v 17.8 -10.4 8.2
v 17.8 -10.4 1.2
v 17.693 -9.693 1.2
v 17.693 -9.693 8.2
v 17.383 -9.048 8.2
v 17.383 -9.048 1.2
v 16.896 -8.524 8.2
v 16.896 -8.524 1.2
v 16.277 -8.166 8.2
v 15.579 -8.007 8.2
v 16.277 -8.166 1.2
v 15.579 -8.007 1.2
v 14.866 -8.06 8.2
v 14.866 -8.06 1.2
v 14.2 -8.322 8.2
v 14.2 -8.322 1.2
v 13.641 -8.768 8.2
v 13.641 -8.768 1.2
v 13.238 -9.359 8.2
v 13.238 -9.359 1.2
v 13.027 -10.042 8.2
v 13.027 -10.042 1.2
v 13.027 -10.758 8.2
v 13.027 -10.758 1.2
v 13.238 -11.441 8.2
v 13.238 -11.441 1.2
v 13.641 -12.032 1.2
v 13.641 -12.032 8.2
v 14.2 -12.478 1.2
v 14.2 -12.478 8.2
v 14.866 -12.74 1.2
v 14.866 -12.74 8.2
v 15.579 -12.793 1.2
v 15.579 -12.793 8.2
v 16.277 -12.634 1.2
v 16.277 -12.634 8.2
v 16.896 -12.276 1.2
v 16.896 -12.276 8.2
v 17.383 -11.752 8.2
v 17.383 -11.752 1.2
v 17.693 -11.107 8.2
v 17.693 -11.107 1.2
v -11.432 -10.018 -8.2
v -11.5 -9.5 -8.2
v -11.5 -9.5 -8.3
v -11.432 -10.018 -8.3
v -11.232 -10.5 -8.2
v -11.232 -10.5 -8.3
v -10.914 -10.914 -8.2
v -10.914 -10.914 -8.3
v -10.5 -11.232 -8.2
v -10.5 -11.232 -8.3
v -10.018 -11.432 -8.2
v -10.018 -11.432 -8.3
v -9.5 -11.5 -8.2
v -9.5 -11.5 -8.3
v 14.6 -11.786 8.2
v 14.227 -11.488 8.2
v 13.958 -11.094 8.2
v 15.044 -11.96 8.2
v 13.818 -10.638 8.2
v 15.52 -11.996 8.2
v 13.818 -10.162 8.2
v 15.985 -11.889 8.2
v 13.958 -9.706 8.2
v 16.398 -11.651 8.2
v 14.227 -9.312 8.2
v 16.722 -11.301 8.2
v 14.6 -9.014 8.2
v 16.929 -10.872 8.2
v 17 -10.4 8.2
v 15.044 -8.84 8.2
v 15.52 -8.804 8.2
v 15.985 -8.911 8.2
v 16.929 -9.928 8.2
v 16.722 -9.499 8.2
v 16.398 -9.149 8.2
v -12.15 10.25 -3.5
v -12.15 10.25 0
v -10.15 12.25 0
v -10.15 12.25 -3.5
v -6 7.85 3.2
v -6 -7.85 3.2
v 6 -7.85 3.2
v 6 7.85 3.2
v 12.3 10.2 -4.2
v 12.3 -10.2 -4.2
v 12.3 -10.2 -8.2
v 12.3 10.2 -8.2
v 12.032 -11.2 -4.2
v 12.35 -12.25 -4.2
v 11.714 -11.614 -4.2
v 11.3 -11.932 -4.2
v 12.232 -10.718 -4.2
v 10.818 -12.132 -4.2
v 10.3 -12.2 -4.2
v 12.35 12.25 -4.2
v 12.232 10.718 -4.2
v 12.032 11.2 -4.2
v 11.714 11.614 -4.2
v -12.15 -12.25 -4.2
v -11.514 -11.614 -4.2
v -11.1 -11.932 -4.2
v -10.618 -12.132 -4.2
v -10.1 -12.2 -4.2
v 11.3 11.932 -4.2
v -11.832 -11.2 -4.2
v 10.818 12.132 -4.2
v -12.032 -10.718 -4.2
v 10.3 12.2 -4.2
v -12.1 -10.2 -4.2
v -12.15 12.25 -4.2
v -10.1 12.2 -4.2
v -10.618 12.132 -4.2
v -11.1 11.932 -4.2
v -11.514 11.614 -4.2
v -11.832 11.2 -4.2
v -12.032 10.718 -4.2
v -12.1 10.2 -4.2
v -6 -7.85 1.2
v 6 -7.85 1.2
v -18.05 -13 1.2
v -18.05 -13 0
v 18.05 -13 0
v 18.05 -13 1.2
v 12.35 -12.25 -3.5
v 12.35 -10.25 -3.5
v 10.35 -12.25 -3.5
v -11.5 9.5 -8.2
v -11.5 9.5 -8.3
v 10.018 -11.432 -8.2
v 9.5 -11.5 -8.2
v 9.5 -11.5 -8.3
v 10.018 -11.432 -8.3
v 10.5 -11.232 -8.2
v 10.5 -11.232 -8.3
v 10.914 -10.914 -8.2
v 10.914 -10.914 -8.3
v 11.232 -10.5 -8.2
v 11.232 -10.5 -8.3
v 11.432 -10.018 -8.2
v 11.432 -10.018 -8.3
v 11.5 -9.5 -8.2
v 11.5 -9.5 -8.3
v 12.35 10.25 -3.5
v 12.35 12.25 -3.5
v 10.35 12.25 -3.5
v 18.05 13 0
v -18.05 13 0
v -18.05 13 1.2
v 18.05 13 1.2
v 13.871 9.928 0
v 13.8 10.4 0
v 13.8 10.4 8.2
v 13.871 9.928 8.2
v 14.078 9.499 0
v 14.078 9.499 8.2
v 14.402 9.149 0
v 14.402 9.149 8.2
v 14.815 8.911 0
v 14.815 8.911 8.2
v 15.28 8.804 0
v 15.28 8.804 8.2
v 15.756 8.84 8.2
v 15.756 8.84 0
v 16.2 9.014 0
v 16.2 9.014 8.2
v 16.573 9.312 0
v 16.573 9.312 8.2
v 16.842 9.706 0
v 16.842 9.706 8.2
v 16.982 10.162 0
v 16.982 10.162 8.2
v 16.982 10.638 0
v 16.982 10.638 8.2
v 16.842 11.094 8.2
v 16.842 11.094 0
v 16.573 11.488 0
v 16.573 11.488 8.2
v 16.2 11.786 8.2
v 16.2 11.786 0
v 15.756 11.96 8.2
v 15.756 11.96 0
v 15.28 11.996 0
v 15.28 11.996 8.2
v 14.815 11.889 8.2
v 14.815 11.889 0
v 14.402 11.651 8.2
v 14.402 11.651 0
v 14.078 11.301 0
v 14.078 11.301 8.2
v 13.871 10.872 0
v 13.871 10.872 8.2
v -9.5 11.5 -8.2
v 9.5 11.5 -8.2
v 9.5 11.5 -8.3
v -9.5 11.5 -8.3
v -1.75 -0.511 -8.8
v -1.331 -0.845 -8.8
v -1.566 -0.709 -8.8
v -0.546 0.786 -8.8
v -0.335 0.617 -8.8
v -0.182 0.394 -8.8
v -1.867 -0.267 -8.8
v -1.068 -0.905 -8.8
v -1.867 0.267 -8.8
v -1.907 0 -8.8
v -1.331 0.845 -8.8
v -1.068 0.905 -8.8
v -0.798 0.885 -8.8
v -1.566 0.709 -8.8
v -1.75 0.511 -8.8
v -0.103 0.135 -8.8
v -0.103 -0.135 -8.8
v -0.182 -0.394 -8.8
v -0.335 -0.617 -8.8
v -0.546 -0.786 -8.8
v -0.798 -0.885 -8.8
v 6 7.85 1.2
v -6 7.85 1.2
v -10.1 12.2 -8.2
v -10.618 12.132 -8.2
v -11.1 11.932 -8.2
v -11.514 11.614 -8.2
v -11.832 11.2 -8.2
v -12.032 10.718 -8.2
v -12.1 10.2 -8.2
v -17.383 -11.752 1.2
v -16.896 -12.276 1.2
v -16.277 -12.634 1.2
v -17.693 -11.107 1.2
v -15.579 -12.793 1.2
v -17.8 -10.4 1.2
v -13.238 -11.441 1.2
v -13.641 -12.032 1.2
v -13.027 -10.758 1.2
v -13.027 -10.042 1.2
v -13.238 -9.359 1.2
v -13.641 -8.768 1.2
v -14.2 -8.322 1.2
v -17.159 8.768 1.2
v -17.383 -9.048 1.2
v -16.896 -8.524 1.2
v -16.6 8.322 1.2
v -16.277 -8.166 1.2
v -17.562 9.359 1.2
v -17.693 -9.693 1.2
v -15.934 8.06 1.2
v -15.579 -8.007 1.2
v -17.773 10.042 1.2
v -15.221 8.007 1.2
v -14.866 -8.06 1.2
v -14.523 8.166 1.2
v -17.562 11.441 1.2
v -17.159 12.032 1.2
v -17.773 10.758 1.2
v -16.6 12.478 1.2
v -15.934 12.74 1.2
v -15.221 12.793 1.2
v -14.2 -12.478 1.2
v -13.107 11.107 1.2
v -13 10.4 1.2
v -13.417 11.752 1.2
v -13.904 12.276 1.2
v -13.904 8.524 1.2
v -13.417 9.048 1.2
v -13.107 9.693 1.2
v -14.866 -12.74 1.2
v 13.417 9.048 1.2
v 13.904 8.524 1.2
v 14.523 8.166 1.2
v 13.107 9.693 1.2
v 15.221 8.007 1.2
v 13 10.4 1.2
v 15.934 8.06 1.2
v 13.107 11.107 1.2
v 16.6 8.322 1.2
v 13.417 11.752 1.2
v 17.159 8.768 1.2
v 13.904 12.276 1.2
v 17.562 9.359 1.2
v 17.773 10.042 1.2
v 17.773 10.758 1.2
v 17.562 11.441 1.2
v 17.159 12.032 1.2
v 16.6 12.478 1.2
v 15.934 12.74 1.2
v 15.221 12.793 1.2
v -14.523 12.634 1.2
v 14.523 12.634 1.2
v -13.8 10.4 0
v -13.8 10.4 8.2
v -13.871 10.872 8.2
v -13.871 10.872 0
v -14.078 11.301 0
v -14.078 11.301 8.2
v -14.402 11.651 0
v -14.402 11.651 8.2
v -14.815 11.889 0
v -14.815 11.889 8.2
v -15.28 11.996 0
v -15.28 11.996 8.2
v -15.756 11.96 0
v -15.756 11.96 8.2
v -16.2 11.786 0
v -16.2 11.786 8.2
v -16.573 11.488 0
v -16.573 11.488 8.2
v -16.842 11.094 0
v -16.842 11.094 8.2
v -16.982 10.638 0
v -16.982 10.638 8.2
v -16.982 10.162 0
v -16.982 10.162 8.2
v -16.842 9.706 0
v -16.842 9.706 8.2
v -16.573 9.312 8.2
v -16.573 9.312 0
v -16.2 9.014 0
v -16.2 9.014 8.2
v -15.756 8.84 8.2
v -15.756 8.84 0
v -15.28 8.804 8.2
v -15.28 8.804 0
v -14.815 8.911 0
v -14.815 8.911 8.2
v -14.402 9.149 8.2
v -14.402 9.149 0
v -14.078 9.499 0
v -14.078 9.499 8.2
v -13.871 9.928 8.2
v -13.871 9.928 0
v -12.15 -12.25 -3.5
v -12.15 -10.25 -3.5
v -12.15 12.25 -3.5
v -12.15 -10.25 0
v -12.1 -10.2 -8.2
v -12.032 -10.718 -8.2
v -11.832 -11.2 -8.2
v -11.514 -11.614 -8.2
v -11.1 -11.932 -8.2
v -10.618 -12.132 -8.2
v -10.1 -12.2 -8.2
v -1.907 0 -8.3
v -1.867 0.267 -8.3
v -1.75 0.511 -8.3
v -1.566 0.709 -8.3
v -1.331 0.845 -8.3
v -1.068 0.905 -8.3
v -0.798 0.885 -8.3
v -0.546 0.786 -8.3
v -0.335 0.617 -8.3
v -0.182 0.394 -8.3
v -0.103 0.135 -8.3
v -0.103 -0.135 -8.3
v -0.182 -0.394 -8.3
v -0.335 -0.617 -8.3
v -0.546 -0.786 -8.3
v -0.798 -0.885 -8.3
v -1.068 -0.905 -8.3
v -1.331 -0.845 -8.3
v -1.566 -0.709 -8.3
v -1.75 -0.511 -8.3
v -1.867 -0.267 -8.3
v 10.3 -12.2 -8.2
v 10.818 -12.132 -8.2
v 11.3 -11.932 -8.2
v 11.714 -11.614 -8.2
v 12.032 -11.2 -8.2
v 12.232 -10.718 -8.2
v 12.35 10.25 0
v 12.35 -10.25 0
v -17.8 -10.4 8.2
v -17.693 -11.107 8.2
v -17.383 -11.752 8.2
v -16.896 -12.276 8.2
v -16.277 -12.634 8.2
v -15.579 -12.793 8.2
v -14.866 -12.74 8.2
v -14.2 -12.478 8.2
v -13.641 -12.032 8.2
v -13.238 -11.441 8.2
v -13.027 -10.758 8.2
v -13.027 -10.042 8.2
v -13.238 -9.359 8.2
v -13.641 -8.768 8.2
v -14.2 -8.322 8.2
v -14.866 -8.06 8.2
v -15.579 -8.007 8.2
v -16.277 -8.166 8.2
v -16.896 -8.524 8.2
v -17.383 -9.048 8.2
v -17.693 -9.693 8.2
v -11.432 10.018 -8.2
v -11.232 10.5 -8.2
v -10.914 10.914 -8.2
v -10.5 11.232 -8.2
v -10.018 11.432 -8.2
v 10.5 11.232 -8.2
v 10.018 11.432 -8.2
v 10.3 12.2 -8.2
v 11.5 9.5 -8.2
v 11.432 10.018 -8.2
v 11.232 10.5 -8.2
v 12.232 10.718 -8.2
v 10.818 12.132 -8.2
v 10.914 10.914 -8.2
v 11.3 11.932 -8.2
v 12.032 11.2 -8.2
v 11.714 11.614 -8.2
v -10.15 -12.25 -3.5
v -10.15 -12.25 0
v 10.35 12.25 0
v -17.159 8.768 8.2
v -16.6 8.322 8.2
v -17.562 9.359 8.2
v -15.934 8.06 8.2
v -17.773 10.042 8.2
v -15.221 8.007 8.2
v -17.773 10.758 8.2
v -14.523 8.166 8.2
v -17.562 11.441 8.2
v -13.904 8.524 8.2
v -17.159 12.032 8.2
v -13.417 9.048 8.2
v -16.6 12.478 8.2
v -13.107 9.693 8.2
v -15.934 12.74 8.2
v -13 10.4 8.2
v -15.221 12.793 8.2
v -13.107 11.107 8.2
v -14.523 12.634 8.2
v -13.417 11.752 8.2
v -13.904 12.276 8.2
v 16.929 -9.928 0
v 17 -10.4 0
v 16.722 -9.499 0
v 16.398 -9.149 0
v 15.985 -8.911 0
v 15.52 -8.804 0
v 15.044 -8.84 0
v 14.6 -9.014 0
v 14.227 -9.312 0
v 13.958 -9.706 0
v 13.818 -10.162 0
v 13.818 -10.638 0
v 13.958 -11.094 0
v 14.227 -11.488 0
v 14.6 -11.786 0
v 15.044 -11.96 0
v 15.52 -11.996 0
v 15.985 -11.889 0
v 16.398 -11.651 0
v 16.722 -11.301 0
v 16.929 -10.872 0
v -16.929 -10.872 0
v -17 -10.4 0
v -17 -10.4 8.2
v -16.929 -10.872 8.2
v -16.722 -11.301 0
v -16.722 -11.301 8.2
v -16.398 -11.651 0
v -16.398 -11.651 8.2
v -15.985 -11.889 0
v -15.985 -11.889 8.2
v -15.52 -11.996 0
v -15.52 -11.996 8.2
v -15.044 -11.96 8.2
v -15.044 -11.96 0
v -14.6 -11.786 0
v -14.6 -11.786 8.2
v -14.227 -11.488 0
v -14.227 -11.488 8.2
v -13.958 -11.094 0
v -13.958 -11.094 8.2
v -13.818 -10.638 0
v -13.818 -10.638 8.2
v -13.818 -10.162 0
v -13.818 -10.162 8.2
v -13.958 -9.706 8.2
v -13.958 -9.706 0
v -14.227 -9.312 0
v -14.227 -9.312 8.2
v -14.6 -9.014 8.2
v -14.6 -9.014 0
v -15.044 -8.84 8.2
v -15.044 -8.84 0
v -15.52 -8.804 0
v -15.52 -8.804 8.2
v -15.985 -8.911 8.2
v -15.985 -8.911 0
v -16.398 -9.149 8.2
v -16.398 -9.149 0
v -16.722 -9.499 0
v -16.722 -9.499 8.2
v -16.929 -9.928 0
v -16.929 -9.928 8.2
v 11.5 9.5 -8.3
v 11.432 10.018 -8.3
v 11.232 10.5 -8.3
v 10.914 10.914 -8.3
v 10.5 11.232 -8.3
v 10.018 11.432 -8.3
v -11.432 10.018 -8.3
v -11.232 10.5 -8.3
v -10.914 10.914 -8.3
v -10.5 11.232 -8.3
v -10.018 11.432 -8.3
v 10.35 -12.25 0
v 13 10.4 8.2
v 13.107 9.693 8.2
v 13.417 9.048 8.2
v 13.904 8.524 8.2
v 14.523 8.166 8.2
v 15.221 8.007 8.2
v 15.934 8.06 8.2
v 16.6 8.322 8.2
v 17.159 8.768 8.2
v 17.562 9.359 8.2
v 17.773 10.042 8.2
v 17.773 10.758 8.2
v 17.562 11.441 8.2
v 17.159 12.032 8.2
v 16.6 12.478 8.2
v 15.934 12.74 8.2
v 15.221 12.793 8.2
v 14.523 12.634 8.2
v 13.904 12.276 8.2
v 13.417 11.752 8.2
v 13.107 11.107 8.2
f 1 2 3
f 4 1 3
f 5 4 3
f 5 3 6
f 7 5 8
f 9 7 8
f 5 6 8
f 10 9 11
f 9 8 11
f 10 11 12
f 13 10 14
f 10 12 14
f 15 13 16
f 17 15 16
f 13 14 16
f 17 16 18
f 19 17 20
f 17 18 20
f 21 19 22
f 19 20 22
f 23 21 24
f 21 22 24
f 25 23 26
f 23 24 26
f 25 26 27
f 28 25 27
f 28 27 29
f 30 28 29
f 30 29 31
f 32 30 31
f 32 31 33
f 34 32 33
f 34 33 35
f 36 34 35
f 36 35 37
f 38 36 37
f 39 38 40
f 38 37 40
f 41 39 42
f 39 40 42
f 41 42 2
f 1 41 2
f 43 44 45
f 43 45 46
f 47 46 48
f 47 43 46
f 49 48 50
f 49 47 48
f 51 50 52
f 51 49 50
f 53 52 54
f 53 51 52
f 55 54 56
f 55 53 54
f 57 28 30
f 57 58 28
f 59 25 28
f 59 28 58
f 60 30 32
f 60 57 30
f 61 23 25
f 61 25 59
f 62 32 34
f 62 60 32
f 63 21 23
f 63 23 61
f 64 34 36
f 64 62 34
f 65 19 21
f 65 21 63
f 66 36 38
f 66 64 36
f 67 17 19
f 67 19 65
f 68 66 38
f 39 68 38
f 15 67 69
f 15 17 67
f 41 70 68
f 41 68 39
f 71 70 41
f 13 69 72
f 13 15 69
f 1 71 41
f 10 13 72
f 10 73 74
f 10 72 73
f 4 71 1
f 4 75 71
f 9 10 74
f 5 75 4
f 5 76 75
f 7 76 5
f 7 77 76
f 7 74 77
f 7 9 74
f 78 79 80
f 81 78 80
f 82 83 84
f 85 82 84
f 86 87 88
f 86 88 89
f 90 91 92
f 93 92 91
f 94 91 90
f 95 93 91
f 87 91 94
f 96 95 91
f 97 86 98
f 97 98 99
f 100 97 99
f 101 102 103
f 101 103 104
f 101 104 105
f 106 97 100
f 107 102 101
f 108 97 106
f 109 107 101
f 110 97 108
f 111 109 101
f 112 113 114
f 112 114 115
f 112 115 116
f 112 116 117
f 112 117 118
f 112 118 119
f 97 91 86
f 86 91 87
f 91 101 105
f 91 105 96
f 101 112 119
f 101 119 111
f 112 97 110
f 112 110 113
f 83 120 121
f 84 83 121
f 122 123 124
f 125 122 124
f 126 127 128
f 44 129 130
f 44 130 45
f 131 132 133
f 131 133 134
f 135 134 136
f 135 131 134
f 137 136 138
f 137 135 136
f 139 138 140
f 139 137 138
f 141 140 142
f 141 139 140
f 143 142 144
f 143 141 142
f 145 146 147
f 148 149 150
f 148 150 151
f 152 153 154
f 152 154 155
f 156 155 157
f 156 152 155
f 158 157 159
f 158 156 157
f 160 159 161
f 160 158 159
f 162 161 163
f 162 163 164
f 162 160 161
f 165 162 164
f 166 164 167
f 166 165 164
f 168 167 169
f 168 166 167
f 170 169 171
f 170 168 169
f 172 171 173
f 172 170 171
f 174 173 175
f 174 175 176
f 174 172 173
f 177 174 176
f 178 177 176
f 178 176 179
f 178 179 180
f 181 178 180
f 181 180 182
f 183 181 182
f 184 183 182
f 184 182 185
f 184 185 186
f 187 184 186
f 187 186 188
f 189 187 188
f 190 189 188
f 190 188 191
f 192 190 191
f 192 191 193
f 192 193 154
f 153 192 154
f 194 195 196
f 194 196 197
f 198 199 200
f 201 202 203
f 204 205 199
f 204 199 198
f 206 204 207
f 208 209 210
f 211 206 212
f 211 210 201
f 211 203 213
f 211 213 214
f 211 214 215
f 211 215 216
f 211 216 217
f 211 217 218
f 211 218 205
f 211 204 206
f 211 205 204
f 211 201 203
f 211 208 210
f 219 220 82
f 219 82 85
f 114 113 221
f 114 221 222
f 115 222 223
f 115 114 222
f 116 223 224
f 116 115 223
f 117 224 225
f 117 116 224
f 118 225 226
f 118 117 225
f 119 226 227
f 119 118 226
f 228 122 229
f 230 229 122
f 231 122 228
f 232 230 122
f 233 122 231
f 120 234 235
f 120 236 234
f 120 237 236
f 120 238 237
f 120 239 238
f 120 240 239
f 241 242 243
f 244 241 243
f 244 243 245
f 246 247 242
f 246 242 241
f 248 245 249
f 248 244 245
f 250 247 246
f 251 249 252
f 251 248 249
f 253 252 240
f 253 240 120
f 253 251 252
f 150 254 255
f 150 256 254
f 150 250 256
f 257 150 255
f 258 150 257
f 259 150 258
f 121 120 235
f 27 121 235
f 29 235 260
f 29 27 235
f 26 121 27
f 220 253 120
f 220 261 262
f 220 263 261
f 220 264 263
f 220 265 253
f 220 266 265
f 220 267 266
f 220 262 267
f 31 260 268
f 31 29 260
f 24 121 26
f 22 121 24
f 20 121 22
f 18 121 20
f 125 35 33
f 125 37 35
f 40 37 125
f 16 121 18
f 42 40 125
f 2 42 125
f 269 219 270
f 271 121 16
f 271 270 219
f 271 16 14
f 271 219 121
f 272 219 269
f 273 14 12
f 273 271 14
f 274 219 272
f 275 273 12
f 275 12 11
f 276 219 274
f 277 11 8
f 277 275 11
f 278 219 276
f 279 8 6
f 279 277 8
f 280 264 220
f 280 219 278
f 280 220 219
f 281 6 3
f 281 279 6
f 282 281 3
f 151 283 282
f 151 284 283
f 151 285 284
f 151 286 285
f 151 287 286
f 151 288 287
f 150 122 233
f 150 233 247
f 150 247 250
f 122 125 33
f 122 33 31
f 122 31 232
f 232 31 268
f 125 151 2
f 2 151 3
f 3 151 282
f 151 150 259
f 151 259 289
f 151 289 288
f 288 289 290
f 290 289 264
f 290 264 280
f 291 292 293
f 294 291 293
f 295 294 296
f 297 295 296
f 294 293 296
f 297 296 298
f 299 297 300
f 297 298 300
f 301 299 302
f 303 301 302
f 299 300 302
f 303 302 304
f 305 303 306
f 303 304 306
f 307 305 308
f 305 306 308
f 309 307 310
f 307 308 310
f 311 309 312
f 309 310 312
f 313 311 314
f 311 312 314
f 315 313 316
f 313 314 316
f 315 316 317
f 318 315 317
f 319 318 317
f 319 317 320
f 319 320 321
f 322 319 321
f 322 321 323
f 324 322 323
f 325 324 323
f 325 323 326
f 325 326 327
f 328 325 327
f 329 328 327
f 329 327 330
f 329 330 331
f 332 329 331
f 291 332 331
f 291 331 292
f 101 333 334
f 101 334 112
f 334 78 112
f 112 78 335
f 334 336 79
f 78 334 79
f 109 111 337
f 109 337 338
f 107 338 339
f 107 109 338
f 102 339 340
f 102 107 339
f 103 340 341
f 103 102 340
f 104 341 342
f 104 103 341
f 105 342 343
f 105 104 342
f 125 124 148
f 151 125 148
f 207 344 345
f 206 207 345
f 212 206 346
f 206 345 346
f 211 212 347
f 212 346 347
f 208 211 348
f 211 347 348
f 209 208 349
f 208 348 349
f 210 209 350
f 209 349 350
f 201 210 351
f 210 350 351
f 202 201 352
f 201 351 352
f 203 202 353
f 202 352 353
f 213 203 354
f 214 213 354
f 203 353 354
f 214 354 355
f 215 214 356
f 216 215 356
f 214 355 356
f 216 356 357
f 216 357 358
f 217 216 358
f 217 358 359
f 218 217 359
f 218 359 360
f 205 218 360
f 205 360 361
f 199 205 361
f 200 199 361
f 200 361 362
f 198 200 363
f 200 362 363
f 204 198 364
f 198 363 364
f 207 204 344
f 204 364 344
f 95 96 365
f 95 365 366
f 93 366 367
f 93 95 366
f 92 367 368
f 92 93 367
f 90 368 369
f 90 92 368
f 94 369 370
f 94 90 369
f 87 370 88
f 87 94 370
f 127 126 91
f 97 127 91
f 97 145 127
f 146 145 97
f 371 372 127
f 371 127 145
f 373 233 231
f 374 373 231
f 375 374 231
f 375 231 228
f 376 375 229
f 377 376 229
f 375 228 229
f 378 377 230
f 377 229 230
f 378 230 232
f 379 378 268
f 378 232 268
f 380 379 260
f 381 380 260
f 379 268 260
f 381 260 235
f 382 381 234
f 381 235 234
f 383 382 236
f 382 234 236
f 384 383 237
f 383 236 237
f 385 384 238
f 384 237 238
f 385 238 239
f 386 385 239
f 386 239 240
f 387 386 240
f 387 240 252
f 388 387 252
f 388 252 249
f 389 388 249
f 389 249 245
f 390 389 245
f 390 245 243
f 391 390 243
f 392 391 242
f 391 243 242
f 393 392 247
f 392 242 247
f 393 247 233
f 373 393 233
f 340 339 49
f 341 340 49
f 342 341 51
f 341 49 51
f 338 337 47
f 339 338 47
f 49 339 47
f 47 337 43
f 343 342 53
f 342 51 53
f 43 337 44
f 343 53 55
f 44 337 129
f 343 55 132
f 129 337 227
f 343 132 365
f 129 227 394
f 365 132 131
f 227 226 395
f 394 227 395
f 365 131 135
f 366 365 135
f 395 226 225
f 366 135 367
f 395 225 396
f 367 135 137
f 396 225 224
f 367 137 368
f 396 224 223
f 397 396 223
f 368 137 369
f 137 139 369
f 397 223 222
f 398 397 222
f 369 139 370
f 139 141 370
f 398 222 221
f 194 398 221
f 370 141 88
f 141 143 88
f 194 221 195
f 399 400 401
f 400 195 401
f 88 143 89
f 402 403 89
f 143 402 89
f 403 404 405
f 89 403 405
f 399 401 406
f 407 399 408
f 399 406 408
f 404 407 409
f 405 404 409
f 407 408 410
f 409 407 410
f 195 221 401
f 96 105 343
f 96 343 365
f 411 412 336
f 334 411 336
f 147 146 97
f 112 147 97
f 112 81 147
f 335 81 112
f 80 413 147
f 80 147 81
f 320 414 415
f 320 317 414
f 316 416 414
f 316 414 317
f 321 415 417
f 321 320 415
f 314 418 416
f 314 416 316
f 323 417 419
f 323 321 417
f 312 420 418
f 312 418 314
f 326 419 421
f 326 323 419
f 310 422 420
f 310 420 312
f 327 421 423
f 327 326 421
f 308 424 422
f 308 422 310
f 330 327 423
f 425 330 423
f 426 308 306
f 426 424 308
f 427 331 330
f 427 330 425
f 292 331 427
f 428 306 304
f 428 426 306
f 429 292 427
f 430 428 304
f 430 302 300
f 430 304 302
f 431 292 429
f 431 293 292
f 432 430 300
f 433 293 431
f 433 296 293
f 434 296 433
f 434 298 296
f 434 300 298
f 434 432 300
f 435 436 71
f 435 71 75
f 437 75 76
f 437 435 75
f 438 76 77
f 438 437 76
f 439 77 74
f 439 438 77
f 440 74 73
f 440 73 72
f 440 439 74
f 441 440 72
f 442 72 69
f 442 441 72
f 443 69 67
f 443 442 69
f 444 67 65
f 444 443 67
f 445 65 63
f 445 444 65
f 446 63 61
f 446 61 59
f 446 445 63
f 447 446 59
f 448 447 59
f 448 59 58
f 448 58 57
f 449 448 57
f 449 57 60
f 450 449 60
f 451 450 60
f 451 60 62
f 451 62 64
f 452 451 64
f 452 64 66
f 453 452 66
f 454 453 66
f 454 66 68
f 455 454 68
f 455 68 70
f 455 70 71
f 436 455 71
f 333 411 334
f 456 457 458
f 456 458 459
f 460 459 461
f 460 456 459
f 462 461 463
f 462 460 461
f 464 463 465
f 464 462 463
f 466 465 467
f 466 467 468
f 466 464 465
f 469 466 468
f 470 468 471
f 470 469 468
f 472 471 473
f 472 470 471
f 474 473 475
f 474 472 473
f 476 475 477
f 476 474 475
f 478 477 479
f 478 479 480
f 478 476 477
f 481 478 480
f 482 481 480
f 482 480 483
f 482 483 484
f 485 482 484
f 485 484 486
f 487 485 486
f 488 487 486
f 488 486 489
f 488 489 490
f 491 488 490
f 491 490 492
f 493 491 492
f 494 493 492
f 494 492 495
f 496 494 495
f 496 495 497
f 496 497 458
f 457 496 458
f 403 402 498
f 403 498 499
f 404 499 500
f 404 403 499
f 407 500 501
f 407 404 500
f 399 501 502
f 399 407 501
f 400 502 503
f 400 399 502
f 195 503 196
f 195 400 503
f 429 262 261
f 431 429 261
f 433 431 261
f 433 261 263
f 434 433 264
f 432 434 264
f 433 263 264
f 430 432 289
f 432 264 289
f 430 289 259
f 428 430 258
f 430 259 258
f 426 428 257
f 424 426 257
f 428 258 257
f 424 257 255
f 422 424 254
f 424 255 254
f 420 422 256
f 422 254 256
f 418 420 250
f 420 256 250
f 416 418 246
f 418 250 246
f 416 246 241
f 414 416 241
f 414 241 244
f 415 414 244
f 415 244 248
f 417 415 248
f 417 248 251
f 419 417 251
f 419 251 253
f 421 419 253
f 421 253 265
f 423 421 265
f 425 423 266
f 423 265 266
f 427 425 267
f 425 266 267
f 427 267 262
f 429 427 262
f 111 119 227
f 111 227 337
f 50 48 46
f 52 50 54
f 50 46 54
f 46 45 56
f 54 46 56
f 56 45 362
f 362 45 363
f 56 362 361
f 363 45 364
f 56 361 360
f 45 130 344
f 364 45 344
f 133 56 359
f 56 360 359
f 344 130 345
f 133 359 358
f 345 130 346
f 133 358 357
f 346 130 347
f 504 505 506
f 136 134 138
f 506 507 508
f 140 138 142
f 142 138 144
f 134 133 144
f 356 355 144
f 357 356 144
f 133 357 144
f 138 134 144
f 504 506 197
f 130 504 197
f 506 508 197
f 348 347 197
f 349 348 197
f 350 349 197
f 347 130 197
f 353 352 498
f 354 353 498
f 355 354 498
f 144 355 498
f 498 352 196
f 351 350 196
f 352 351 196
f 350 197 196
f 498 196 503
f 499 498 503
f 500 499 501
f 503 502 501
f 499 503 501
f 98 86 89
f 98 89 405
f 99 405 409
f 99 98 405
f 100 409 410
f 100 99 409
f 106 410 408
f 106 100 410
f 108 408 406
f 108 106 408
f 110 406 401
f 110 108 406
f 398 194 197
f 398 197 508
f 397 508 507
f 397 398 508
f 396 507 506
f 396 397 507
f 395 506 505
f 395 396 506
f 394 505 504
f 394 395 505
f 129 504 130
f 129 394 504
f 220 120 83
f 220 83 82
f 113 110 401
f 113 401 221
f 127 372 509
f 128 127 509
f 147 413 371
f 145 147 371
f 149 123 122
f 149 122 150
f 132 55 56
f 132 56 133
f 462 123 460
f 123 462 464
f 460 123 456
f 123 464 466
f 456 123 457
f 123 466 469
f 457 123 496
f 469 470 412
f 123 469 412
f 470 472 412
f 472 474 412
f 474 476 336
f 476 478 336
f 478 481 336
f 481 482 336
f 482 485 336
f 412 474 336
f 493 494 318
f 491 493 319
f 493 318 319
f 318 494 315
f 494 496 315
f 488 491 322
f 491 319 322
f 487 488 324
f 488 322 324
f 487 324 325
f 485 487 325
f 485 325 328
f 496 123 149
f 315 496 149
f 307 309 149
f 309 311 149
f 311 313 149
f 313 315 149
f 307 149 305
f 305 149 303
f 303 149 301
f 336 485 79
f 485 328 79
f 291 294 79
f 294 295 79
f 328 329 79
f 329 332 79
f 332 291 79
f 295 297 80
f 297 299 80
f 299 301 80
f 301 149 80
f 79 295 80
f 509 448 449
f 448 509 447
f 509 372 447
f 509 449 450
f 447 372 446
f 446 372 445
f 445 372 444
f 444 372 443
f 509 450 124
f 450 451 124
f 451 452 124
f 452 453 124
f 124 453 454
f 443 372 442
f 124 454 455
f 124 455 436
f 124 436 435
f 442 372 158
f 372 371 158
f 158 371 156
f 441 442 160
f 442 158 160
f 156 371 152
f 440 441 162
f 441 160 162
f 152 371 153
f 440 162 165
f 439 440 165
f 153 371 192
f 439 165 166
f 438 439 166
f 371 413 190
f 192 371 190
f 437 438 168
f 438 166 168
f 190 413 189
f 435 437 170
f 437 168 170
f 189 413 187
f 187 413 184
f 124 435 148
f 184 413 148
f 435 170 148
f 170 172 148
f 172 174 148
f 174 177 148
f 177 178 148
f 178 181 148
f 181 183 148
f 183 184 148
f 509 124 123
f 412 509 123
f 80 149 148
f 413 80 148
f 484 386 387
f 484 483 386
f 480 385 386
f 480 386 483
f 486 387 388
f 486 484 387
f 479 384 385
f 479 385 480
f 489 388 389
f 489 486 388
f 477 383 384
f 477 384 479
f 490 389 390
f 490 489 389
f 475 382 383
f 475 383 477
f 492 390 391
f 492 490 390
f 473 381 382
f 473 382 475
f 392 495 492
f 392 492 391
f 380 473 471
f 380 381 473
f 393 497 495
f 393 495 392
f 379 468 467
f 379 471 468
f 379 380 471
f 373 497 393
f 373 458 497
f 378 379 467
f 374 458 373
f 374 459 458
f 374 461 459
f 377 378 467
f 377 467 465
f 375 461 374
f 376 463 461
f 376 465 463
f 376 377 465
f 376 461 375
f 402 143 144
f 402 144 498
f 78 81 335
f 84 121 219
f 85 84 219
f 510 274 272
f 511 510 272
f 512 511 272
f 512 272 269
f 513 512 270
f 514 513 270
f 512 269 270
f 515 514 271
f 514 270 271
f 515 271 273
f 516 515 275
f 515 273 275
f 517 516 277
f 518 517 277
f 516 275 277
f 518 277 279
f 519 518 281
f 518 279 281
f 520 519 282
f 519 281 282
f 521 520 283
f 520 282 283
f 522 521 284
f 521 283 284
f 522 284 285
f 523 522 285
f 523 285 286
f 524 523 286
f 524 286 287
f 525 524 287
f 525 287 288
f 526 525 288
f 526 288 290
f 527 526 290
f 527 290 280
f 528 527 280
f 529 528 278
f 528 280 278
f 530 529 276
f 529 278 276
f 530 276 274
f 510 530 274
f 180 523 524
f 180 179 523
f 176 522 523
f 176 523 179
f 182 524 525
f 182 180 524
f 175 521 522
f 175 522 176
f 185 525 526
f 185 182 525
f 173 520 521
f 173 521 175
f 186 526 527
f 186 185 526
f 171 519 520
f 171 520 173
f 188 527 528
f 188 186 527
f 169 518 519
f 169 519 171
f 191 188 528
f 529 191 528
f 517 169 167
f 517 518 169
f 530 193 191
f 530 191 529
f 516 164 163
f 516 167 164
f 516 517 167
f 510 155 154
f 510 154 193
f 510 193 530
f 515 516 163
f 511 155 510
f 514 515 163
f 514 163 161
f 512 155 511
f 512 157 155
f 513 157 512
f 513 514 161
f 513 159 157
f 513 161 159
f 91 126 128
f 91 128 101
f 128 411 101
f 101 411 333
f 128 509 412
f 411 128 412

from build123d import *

# Parameters (mm, degrees)
SKETCH1_W           = 36.1
SKETCH1_H           = 26
SKETCH1_R           = 1.6
BOSS_EXTRUDE1_DEPTH = 1.2
BOSS_EXTRUDE2_DEPTH = 3.5
SKETCH3_W           = 24.5
SKETCH3_H           = 24.5
BOSS_EXTRUDE3_DEPTH = 0.7
BOSS_EXTRUDE5_DEPTH = 4
BOSS_EXTRUDE6_DEPTH = 0.1
SKETCH6_R           = 0.907363589
BOSS_EXTRUDE7_DEPTH = 0.5
SKETCH7_W           = 12
SKETCH7_H           = 15.7
BOSS_EXTRUDE8_DEPTH = 2
SKETCH8_R           = 2.4
BOSS_EXTRUDE9_DEPTH = 7
SKETCH9_R           = 1.6
CUT_EXTRUDE3_DEPTH  = 28.996472992


with BuildPart() as part:
    # Sketch1 → Boss-Extrude1 (new body)
    with BuildSketch(Plane.XY):
        Rectangle(SKETCH1_W, SKETCH1_H)
        with Locations((-15.4, 10.4)):
            Circle(SKETCH1_R, mode=Mode.SUBTRACT)
        with Locations(Location((15.4, 10.4, 0), (0, 0, 180))):
            Circle(SKETCH1_R, mode=Mode.SUBTRACT)
        with Locations((15.4, -10.4)):
            Circle(SKETCH1_R, mode=Mode.SUBTRACT)
        with Locations(Location((-15.4, -10.4, 0), (0, 0, 180))):
            Circle(SKETCH1_R, mode=Mode.SUBTRACT)
    extrude(amount=BOSS_EXTRUDE1_DEPTH)

    # Sketch2 → Boss-Extrude2 (add)
    with BuildSketch(Plane(origin=(0, 0, 0), x_dir=(-1, 0, 0), z_dir=(0, 0, -1))):
        Polygon((-10.35, 12.25), (-12.35, 10.25), (-12.35, -10.25), (-10.35, -12.25), (10.15, -12.25), (12.15, -10.25), (12.15, 10.25), (10.15, 12.25), align=None)
    extrude(amount=BOSS_EXTRUDE2_DEPTH)

    # Sketch3 → Boss-Extrude3 (add)
    with BuildSketch(Plane(origin=(0, 0, -3.5), x_dir=(-1, 0, 0), z_dir=(0, 0, -1))):
        with Locations((-0.1, 0)):
            Rectangle(SKETCH3_W, SKETCH3_H)
    extrude(amount=BOSS_EXTRUDE3_DEPTH)

    # Sketch4 → Boss-Extrude5 (add)
    with BuildSketch(Plane(origin=(0, 0, -4.2), x_dir=(-1, 0, 0), z_dir=(0, 0, -1))):
        with BuildLine():
            Line((10.1, -12.2), (-10.3, -12.2))
            ThreePointArc((-10.3, -12.2), (-11.714213562, -11.614213562), (-12.3, -10.2))
            Line((-12.3, -10.2), (-12.3, 10.2))
            ThreePointArc((-12.3, 10.2), (-11.714213562, 11.614213562), (-10.3, 12.2))
            Line((-10.3, 12.2), (10.1, 12.2))
            ThreePointArc((10.1, 12.2), (11.514213562, 11.614213562), (12.1, 10.2))
            Line((12.1, 10.2), (12.1, -10.2))
            ThreePointArc((12.1, -10.2), (11.514213562, -11.614213562), (10.1, -12.2))
        make_face()
    extrude(amount=BOSS_EXTRUDE5_DEPTH)

    # Sketch5 → Boss-Extrude6 (add)
    with BuildSketch(Plane(origin=(0, 0, -8.2), x_dir=(-1, 0, 0), z_dir=(0, 0, -1))):
        with BuildLine():
            Line((9.5, -11.5), (-9.5, -11.5))
            ThreePointArc((-9.5, -11.5), (-10.914213562, -10.914213562), (-11.5, -9.5))
            Line((-11.5, -9.5), (-11.5, 9.5))
            ThreePointArc((-11.5, 9.5), (-10.914213562, 10.914213562), (-9.5, 11.5))
            Line((-9.5, 11.5), (9.5, 11.5))
            ThreePointArc((9.5, 11.5), (10.914213562, 10.914213562), (11.5, 9.5))
            Line((11.5, 9.5), (11.5, -9.5))
            ThreePointArc((11.5, -9.5), (10.914213562, -10.914213562), (9.5, -11.5))
        make_face()
    extrude(amount=BOSS_EXTRUDE6_DEPTH)

    # Sketch6 → Boss-Extrude7 (add)
    with BuildSketch(Plane(origin=(0, 0, -8.3), x_dir=(-1, 0, 0), z_dir=(0, 0, -1))):
        with Locations((1, 0)):
            Circle(SKETCH6_R)
    extrude(amount=BOSS_EXTRUDE7_DEPTH)

    # Sketch7 → Boss-Extrude8 (add)
    with BuildSketch(Plane.XY.offset(1.2)):
        Rectangle(SKETCH7_W, SKETCH7_H)
    extrude(amount=BOSS_EXTRUDE8_DEPTH)

    # Sketch8 → Boss-Extrude9 (add)
    with BuildSketch(Plane.XY.offset(1.2)):
        with Locations((-15.4, 10.4)):
            Circle(SKETCH8_R)
        with Locations(Location((15.4, 10.4, 0), (0, 0, 180))):
            Circle(SKETCH8_R)
        with Locations((15.4, -10.4)):
            Circle(SKETCH8_R)
        with Locations(Location((-15.4, -10.4, 0), (0, 0, 180))):
            Circle(SKETCH8_R)
    extrude(amount=BOSS_EXTRUDE9_DEPTH)

    # Sketch9 → Cut-Extrude3 (cut, through all)
    with BuildSketch(Plane.XY.offset(8.2)):
        with Locations((-15.4, 10.4)):
            Circle(SKETCH9_R)
        with Locations(Location((-15.4, -10.4, 0), (0, 0, 180))):
            Circle(SKETCH9_R)
        with Locations((15.4, -10.4)):
            Circle(SKETCH9_R)
        with Locations(Location((15.4, 10.4, 0), (0, 0, 180))):
            Circle(SKETCH9_R)
    extrude(amount=-CUT_EXTRUDE3_DEPTH, mode=Mode.SUBTRACT)


solid = part.part
